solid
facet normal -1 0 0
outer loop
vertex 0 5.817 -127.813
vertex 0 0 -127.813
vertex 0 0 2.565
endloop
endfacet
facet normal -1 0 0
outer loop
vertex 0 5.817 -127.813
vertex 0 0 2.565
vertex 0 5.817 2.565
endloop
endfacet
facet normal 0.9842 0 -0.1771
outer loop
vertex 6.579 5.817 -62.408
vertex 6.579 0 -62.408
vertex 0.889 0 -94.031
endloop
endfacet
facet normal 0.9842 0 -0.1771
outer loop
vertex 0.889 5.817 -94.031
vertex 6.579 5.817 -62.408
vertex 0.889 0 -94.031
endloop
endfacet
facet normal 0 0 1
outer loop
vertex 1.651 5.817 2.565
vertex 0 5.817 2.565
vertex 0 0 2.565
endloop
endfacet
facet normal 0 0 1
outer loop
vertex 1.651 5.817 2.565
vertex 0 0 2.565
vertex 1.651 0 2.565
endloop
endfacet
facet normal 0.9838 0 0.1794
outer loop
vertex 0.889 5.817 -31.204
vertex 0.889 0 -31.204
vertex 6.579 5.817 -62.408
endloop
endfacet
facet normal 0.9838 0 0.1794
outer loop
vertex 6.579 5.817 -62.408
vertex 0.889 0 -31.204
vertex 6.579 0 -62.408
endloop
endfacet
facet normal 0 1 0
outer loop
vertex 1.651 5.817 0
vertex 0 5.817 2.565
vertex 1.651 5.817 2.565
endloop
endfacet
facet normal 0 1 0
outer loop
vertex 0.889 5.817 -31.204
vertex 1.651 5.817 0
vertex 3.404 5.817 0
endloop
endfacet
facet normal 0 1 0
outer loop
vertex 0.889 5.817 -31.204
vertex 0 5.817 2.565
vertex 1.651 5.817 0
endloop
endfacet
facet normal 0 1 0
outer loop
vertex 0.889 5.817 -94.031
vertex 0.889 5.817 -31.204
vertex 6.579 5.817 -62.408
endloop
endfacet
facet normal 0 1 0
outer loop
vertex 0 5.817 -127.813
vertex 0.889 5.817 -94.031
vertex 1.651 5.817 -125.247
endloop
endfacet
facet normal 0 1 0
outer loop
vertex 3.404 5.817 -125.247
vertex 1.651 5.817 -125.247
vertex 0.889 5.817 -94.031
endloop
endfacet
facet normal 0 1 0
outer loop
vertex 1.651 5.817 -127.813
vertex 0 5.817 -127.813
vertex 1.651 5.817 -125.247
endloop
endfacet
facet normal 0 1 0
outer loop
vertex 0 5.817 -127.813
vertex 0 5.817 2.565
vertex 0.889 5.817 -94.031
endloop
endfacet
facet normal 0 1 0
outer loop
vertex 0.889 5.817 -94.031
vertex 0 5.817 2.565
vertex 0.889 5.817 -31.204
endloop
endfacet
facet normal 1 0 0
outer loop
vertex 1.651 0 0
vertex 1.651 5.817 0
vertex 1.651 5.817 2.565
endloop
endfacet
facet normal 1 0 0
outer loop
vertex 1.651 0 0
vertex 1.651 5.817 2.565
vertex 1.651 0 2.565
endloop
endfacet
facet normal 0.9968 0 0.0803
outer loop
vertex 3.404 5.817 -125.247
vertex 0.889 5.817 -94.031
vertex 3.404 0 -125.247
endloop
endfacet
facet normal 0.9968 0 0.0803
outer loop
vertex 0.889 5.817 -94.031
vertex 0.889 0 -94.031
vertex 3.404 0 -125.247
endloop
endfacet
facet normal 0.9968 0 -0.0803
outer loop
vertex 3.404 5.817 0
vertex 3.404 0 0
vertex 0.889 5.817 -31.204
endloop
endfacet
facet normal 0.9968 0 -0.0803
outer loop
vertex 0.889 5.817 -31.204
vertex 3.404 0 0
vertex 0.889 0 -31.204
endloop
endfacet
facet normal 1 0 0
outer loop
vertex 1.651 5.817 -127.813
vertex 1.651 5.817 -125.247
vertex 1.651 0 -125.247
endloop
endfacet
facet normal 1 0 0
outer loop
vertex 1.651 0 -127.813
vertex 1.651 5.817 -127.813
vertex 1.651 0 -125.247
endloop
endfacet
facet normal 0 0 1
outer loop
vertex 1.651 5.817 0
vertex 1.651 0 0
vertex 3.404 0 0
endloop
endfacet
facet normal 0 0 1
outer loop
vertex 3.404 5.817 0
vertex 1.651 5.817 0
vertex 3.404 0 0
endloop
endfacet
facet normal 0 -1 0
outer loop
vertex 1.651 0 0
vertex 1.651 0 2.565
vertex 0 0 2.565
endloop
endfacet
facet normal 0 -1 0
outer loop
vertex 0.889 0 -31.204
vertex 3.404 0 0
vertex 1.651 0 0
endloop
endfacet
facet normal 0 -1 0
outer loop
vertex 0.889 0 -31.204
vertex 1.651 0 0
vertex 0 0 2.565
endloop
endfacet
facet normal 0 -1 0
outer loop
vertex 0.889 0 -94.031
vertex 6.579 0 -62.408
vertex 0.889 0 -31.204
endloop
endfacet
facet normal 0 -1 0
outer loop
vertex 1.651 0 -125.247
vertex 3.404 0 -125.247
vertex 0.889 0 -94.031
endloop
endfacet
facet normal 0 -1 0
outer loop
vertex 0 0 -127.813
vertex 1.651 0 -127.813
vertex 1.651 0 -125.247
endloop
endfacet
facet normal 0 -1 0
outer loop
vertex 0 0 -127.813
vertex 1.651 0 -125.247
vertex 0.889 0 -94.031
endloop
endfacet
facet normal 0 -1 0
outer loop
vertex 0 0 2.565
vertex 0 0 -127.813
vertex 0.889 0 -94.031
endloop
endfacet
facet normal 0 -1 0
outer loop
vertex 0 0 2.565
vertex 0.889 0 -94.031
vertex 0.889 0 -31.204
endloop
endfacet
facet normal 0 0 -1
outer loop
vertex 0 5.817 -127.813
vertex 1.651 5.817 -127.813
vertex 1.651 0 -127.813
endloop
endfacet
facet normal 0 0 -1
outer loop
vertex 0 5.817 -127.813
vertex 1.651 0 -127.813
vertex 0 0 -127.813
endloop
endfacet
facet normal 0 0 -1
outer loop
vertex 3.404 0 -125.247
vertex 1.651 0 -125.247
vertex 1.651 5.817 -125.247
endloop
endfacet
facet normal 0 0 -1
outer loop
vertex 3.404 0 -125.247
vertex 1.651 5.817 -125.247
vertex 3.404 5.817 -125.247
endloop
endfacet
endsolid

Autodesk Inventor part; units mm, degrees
ref_plane "YZ Plane" through (0, 0, 0) normal (1, 0, 0) x (0, 1, 0)
ref_plane "XZ Plane" through (0, 0, 0) normal (0, 1, 0) x (-1, 0, 0)
ref_plane "XY Plane" through (0, 0, 0) normal (0, 0, 1) x (1, 0, 0)
sketch "Sketch1" plane through (0, 0, 0) normal (0, 1, 0) x (-1, 0, 0)
  line L0 (0, 0) -> (0, -125.2474)
  line L1 (0, -125.2474) -> (-3.4036, -125.2474)
  line L2 (0, 0) -> (-3.4036, 0)
  line L3 (-3.4036, 0) -> (-0.889, -31.2039)
  line L4 (-0.889, -31.2039) -> (-6.5786, -62.4078)
  line L5 (-6.5786, -62.4078) -> (-0.889, -94.0308)
  line L6 (-0.889, -94.0308) -> (-3.4036, -125.2474)
  dimension "d0" = 125.2474
  dimension "d1" = 3.4036
  dimension "d2" = 3.4036
  dimension "d3" = 31.2039
  dimension "d4" = 62.4078
  dimension "d5" = 31.2166
  dimension "d15" = 6.5786
  dimension "d16" = 0.889
  dimension "d17" = 0.889
extrude "Extrusion1" add sketch "Sketch1" along normal blind 5.8166
sketch "Sketch2" plane through (0, 0, 0) normal (0, 0, 1) x (1, 0, 0)
  line L0 (3.4036, 0) -> (0, 0) projected
  line L1 (0, 5.8166) -> (1.651, 5.8166)
  line L2 (1.651, 5.8166) -> (1.651, 0)
  line L3 (1.651, 0) -> (0, 0)
  line L4 (0, 0) -> (0, 5.8166)
  dimension "d8" = 1.651
sketch "Sketch3" plane through (3.4036, 0, -125.2474) normal (0, 0, -1) x (-1, 0, 0)
  line L0 (3.4036, 0) -> (3.4036, 5.8166) projected
  line L1 (0, 0) -> (3.4036, 0) projected
  line L2 (3.4036, 5.8166) -> (1.7526, 5.8166)
  line L3 (1.7526, 5.8166) -> (1.7526, 0)
  line L4 (1.7526, 0) -> (3.4036, 0)
  line L5 (3.4036, 0) -> (3.4036, 5.8166)
  dimension "d9" = 1.651
extrude "Extrusion2" add sketch "Sketch3" along normal blind 2.5654
extrude "Extrusion3" add sketch "Sketch2" along normal blind 2.5654
properties part number "long_insert_inv_CPY"
